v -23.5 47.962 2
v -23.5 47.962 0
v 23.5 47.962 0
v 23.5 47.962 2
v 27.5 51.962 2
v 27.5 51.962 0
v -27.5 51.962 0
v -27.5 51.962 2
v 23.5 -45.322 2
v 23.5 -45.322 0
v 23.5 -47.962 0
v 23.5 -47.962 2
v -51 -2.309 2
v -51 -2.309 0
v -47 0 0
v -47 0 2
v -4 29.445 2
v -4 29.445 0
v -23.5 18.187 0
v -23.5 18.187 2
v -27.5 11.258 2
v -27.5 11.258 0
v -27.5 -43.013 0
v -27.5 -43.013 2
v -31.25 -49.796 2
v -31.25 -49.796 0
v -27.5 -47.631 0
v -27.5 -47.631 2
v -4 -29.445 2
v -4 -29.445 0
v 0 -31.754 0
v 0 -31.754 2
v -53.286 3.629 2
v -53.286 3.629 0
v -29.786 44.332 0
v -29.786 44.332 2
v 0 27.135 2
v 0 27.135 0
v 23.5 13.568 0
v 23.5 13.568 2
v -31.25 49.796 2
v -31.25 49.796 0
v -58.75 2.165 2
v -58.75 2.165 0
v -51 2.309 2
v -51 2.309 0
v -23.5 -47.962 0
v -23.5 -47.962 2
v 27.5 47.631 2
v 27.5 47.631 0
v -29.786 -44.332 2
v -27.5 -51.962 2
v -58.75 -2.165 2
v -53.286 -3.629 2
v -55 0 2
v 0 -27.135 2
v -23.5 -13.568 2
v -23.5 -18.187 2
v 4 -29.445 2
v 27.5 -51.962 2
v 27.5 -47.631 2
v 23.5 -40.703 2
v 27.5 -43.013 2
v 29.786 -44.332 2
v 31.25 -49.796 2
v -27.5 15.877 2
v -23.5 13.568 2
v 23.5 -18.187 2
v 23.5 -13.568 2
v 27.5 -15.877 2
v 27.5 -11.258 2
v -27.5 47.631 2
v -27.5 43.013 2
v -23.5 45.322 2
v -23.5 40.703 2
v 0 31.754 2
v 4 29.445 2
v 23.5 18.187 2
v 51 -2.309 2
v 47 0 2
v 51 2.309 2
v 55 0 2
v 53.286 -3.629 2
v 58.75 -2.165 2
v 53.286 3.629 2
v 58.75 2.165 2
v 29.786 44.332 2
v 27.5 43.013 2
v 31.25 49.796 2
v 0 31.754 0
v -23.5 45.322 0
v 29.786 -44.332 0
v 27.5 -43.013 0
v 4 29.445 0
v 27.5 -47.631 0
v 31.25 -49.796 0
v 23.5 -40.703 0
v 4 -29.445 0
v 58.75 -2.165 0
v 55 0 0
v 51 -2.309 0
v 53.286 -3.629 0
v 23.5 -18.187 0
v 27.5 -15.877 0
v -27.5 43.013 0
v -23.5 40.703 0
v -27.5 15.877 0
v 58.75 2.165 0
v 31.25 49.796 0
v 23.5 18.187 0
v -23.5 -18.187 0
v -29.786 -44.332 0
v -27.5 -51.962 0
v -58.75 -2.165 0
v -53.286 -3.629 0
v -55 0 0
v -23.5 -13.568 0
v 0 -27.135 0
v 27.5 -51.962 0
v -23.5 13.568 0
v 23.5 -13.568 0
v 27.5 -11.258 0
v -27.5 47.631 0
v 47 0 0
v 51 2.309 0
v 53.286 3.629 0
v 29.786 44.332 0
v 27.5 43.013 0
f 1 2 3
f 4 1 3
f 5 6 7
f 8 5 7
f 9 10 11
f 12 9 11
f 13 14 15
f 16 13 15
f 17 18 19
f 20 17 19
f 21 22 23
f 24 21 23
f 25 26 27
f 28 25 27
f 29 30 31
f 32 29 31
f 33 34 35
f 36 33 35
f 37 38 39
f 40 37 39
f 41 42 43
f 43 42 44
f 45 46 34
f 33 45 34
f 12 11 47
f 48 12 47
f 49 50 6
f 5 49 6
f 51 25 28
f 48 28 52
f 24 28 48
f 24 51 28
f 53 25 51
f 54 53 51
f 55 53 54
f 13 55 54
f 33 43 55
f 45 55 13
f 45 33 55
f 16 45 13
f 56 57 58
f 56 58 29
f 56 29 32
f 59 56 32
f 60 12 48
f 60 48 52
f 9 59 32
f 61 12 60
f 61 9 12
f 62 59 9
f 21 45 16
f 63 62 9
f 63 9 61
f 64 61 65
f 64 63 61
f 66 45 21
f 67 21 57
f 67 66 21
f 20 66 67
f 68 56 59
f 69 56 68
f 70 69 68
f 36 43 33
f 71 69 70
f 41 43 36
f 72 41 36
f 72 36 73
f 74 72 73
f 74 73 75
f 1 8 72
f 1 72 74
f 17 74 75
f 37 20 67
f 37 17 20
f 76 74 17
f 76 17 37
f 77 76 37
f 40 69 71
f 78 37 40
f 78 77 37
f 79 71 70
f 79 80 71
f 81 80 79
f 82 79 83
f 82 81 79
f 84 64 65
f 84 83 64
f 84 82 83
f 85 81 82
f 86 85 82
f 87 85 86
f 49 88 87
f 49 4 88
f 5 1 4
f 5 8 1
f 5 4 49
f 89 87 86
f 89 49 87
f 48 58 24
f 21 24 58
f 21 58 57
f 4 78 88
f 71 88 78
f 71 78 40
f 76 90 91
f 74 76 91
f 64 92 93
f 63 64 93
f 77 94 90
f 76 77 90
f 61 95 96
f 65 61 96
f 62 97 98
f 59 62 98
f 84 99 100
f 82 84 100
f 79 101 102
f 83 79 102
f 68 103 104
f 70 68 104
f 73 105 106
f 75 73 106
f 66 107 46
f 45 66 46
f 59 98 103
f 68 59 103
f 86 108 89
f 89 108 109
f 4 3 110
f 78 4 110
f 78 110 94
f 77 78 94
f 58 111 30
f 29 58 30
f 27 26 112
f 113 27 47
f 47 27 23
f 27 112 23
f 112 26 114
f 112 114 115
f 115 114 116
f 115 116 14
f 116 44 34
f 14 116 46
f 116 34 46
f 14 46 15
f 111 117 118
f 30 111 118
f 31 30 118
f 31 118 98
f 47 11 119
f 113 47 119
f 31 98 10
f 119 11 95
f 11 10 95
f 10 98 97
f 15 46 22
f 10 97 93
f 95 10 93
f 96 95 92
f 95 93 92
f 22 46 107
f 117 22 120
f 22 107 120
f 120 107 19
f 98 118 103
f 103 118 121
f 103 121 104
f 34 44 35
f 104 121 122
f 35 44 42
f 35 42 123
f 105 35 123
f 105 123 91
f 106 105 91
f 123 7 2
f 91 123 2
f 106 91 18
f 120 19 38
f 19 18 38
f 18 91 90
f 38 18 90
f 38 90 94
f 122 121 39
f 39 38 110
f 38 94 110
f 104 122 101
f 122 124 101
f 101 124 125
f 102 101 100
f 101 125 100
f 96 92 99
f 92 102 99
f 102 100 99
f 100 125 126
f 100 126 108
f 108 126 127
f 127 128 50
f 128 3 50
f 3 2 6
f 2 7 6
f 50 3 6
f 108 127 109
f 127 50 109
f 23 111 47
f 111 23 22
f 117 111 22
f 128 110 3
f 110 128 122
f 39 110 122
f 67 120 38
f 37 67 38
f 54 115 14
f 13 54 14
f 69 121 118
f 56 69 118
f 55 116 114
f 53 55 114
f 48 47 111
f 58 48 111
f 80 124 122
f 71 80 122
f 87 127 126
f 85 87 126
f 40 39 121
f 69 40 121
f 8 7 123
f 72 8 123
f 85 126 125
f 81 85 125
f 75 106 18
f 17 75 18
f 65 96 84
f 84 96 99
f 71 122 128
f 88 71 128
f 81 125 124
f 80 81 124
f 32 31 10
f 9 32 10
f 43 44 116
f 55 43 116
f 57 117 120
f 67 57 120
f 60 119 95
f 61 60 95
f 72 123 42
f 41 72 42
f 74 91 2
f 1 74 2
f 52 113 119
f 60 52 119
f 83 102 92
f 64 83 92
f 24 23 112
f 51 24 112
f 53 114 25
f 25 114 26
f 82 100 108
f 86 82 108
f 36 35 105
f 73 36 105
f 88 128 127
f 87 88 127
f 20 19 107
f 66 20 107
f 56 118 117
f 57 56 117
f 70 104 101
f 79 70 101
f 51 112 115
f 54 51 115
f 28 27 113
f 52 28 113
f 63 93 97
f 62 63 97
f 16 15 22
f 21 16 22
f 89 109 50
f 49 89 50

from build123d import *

# Parameters (mm, degrees)
F1_DEPTH = 2


with BuildPart() as f1:
    # F0 (on Top) → F1 (new body)
    with BuildSketch(Plane.XY):
        Polygon((-23.5, 13.567731326), (-27.5, 11.2583302492), (-27.5, -11.2583302492), (-23.5, -13.567731326), align=None)
        Polygon((-23.5, -13.567731326), (-27.5, -11.2583302492), (-27.5, -15.8771324027), (-23.5, -18.1865334795), align=None)
        Polygon((0, -27.1354626519), (-23.5, -13.567731326), (-23.5, -18.1865334795), (-4, -29.4448637287), align=None)
        Polygon((-23.5, -18.1865334795), (-27.5, -15.8771324027), (-27.5, -43.0125950546), (-23.5, -40.7031939779), align=None)
        Polygon((-23.5, -40.7031939779), (-27.5, -43.0125950546), (-27.5, -47.6313972081), (-23.5, -45.3219961314), align=None)
        Polygon((-51, -2.3094010768), (-55, 0), (-58.75, -2.1650635095), (-31.25, -49.7964607176), (-27.5, -47.6313972081), (-27.5, -43.0125950546), (-29.7858983849, -44.3323591025), (-53.2858983849, -3.6291651246), align=None)
        Polygon((-23.5, -45.3219961314), (-27.5, -47.6313972081), (-27.5, -51.9615242271), (27.5, -51.9615242271), (27.5, -47.6313972081), (23.5, -45.3219961314), (23.5, -47.9615242271), (-23.5, -47.9615242271), align=None)
        Polygon((23.5, -40.7031939779), (4, -29.4448637287), (0, -31.7542648054), (23.5, -45.3219961314), align=None)
        Polygon((27.5, -47.6313972081), (27.5, -43.0125950546), (23.5, -40.7031939779), (23.5, -45.3219961314), align=None)
        Polygon((4, -29.4448637287), (0, -27.1354626519), (-4, -29.4448637287), (0, -31.7542648054), align=None)
        Polygon((23.5, -18.1865334795), (23.5, -13.567731326), (0, -27.1354626519), (4, -29.4448637287), align=None)
        Polygon((27.5, -15.8771324027), (27.5, -11.2583302492), (23.5, -13.567731326), (23.5, -18.1865334795), align=None)
        Polygon((58.75, -2.1650635095), (55, 0), (51, -2.3094010768), (53.2858983849, -3.6291651246), (29.7858983849, -44.3323591025), (27.5, -43.0125950546), (27.5, -47.6313972081), (31.25, -49.7964607176), align=None)
        Polygon((47, 0), (27.5, -11.2583302492), (27.5, -15.8771324027), (51, -2.3094010768), align=None)
        Polygon((-47, 0), (-51, 2.3094010768), (-55, 0), (-51, -2.3094010768), align=None)
        Polygon((-27.5, 11.2583302492), (-27.5, 15.8771324027), (-51, 2.3094010768), (-47, 0), align=None)
        Polygon((-27.5, 43.0125950546), (-27.5, 47.6313972081), (-31.25, 49.7964607176), (-58.75, 2.1650635095), (-55, 0), (-51, 2.3094010768), (-53.2858983849, 3.6291651246), (-29.7858983849, 44.3323591025), align=None)
        Polygon((-4, 29.4448637287), (-23.5, 18.1865334795), (-23.5, 13.567731326), (0, 27.1354626519), align=None)
        Polygon((-23.5, 18.1865334795), (-27.5, 15.8771324027), (-27.5, 11.2583302492), (-23.5, 13.567731326), align=None)
        Polygon((0, 31.7542648054), (-23.5, 45.3219961314), (-23.5, 40.7031939779), (-4, 29.4448637287), align=None)
        Polygon((-23.5, 45.3219961314), (-27.5, 47.6313972081), (-27.5, 43.0125950546), (-23.5, 40.7031939779), align=None)
        Polygon((27.5, 51.9615242271), (-27.5, 51.9615242271), (-27.5, 47.6313972081), (-23.5, 45.3219961314), (-23.5, 47.9615242271), (23.5, 47.9615242271), (23.5, 45.3219961314), (27.5, 47.6313972081), align=None)
        Polygon((4, 29.4448637287), (0, 31.7542648054), (-4, 29.4448637287), (0, 27.1354626519), align=None)
        Polygon((23.5, 18.1865334795), (4, 29.4448637287), (0, 27.1354626519), (23.5, 13.567731326), align=None)
        Polygon((27.5, 15.8771324027), (27.5, 43.0125950546), (23.5, 40.7031939779), (23.5, 18.1865334795), align=None)
        Polygon((27.5, 43.0125950546), (27.5, 47.6313972081), (23.5, 45.3219961314), (23.5, 40.7031939779), align=None)
        Polygon((31.25, 49.7964607176), (27.5, 47.6313972081), (27.5, 43.0125950546), (29.7858983849, 44.3323591025), (53.2858983849, 3.6291651246), (51, 2.3094010768), (55, 0), (58.75, 2.1650635095), align=None)
        Polygon((27.5, 11.2583302492), (27.5, 15.8771324027), (23.5, 18.1865334795), (23.5, 13.567731326), align=None)
        Polygon((27.5, -11.2583302492), (27.5, 11.2583302492), (23.5, 13.567731326), (23.5, -13.567731326), align=None)
        Polygon((55, 0), (51, 2.3094010768), (47, 0), (51, -2.3094010768), align=None)
    extrude(amount=F1_DEPTH)


solid = f1.part
